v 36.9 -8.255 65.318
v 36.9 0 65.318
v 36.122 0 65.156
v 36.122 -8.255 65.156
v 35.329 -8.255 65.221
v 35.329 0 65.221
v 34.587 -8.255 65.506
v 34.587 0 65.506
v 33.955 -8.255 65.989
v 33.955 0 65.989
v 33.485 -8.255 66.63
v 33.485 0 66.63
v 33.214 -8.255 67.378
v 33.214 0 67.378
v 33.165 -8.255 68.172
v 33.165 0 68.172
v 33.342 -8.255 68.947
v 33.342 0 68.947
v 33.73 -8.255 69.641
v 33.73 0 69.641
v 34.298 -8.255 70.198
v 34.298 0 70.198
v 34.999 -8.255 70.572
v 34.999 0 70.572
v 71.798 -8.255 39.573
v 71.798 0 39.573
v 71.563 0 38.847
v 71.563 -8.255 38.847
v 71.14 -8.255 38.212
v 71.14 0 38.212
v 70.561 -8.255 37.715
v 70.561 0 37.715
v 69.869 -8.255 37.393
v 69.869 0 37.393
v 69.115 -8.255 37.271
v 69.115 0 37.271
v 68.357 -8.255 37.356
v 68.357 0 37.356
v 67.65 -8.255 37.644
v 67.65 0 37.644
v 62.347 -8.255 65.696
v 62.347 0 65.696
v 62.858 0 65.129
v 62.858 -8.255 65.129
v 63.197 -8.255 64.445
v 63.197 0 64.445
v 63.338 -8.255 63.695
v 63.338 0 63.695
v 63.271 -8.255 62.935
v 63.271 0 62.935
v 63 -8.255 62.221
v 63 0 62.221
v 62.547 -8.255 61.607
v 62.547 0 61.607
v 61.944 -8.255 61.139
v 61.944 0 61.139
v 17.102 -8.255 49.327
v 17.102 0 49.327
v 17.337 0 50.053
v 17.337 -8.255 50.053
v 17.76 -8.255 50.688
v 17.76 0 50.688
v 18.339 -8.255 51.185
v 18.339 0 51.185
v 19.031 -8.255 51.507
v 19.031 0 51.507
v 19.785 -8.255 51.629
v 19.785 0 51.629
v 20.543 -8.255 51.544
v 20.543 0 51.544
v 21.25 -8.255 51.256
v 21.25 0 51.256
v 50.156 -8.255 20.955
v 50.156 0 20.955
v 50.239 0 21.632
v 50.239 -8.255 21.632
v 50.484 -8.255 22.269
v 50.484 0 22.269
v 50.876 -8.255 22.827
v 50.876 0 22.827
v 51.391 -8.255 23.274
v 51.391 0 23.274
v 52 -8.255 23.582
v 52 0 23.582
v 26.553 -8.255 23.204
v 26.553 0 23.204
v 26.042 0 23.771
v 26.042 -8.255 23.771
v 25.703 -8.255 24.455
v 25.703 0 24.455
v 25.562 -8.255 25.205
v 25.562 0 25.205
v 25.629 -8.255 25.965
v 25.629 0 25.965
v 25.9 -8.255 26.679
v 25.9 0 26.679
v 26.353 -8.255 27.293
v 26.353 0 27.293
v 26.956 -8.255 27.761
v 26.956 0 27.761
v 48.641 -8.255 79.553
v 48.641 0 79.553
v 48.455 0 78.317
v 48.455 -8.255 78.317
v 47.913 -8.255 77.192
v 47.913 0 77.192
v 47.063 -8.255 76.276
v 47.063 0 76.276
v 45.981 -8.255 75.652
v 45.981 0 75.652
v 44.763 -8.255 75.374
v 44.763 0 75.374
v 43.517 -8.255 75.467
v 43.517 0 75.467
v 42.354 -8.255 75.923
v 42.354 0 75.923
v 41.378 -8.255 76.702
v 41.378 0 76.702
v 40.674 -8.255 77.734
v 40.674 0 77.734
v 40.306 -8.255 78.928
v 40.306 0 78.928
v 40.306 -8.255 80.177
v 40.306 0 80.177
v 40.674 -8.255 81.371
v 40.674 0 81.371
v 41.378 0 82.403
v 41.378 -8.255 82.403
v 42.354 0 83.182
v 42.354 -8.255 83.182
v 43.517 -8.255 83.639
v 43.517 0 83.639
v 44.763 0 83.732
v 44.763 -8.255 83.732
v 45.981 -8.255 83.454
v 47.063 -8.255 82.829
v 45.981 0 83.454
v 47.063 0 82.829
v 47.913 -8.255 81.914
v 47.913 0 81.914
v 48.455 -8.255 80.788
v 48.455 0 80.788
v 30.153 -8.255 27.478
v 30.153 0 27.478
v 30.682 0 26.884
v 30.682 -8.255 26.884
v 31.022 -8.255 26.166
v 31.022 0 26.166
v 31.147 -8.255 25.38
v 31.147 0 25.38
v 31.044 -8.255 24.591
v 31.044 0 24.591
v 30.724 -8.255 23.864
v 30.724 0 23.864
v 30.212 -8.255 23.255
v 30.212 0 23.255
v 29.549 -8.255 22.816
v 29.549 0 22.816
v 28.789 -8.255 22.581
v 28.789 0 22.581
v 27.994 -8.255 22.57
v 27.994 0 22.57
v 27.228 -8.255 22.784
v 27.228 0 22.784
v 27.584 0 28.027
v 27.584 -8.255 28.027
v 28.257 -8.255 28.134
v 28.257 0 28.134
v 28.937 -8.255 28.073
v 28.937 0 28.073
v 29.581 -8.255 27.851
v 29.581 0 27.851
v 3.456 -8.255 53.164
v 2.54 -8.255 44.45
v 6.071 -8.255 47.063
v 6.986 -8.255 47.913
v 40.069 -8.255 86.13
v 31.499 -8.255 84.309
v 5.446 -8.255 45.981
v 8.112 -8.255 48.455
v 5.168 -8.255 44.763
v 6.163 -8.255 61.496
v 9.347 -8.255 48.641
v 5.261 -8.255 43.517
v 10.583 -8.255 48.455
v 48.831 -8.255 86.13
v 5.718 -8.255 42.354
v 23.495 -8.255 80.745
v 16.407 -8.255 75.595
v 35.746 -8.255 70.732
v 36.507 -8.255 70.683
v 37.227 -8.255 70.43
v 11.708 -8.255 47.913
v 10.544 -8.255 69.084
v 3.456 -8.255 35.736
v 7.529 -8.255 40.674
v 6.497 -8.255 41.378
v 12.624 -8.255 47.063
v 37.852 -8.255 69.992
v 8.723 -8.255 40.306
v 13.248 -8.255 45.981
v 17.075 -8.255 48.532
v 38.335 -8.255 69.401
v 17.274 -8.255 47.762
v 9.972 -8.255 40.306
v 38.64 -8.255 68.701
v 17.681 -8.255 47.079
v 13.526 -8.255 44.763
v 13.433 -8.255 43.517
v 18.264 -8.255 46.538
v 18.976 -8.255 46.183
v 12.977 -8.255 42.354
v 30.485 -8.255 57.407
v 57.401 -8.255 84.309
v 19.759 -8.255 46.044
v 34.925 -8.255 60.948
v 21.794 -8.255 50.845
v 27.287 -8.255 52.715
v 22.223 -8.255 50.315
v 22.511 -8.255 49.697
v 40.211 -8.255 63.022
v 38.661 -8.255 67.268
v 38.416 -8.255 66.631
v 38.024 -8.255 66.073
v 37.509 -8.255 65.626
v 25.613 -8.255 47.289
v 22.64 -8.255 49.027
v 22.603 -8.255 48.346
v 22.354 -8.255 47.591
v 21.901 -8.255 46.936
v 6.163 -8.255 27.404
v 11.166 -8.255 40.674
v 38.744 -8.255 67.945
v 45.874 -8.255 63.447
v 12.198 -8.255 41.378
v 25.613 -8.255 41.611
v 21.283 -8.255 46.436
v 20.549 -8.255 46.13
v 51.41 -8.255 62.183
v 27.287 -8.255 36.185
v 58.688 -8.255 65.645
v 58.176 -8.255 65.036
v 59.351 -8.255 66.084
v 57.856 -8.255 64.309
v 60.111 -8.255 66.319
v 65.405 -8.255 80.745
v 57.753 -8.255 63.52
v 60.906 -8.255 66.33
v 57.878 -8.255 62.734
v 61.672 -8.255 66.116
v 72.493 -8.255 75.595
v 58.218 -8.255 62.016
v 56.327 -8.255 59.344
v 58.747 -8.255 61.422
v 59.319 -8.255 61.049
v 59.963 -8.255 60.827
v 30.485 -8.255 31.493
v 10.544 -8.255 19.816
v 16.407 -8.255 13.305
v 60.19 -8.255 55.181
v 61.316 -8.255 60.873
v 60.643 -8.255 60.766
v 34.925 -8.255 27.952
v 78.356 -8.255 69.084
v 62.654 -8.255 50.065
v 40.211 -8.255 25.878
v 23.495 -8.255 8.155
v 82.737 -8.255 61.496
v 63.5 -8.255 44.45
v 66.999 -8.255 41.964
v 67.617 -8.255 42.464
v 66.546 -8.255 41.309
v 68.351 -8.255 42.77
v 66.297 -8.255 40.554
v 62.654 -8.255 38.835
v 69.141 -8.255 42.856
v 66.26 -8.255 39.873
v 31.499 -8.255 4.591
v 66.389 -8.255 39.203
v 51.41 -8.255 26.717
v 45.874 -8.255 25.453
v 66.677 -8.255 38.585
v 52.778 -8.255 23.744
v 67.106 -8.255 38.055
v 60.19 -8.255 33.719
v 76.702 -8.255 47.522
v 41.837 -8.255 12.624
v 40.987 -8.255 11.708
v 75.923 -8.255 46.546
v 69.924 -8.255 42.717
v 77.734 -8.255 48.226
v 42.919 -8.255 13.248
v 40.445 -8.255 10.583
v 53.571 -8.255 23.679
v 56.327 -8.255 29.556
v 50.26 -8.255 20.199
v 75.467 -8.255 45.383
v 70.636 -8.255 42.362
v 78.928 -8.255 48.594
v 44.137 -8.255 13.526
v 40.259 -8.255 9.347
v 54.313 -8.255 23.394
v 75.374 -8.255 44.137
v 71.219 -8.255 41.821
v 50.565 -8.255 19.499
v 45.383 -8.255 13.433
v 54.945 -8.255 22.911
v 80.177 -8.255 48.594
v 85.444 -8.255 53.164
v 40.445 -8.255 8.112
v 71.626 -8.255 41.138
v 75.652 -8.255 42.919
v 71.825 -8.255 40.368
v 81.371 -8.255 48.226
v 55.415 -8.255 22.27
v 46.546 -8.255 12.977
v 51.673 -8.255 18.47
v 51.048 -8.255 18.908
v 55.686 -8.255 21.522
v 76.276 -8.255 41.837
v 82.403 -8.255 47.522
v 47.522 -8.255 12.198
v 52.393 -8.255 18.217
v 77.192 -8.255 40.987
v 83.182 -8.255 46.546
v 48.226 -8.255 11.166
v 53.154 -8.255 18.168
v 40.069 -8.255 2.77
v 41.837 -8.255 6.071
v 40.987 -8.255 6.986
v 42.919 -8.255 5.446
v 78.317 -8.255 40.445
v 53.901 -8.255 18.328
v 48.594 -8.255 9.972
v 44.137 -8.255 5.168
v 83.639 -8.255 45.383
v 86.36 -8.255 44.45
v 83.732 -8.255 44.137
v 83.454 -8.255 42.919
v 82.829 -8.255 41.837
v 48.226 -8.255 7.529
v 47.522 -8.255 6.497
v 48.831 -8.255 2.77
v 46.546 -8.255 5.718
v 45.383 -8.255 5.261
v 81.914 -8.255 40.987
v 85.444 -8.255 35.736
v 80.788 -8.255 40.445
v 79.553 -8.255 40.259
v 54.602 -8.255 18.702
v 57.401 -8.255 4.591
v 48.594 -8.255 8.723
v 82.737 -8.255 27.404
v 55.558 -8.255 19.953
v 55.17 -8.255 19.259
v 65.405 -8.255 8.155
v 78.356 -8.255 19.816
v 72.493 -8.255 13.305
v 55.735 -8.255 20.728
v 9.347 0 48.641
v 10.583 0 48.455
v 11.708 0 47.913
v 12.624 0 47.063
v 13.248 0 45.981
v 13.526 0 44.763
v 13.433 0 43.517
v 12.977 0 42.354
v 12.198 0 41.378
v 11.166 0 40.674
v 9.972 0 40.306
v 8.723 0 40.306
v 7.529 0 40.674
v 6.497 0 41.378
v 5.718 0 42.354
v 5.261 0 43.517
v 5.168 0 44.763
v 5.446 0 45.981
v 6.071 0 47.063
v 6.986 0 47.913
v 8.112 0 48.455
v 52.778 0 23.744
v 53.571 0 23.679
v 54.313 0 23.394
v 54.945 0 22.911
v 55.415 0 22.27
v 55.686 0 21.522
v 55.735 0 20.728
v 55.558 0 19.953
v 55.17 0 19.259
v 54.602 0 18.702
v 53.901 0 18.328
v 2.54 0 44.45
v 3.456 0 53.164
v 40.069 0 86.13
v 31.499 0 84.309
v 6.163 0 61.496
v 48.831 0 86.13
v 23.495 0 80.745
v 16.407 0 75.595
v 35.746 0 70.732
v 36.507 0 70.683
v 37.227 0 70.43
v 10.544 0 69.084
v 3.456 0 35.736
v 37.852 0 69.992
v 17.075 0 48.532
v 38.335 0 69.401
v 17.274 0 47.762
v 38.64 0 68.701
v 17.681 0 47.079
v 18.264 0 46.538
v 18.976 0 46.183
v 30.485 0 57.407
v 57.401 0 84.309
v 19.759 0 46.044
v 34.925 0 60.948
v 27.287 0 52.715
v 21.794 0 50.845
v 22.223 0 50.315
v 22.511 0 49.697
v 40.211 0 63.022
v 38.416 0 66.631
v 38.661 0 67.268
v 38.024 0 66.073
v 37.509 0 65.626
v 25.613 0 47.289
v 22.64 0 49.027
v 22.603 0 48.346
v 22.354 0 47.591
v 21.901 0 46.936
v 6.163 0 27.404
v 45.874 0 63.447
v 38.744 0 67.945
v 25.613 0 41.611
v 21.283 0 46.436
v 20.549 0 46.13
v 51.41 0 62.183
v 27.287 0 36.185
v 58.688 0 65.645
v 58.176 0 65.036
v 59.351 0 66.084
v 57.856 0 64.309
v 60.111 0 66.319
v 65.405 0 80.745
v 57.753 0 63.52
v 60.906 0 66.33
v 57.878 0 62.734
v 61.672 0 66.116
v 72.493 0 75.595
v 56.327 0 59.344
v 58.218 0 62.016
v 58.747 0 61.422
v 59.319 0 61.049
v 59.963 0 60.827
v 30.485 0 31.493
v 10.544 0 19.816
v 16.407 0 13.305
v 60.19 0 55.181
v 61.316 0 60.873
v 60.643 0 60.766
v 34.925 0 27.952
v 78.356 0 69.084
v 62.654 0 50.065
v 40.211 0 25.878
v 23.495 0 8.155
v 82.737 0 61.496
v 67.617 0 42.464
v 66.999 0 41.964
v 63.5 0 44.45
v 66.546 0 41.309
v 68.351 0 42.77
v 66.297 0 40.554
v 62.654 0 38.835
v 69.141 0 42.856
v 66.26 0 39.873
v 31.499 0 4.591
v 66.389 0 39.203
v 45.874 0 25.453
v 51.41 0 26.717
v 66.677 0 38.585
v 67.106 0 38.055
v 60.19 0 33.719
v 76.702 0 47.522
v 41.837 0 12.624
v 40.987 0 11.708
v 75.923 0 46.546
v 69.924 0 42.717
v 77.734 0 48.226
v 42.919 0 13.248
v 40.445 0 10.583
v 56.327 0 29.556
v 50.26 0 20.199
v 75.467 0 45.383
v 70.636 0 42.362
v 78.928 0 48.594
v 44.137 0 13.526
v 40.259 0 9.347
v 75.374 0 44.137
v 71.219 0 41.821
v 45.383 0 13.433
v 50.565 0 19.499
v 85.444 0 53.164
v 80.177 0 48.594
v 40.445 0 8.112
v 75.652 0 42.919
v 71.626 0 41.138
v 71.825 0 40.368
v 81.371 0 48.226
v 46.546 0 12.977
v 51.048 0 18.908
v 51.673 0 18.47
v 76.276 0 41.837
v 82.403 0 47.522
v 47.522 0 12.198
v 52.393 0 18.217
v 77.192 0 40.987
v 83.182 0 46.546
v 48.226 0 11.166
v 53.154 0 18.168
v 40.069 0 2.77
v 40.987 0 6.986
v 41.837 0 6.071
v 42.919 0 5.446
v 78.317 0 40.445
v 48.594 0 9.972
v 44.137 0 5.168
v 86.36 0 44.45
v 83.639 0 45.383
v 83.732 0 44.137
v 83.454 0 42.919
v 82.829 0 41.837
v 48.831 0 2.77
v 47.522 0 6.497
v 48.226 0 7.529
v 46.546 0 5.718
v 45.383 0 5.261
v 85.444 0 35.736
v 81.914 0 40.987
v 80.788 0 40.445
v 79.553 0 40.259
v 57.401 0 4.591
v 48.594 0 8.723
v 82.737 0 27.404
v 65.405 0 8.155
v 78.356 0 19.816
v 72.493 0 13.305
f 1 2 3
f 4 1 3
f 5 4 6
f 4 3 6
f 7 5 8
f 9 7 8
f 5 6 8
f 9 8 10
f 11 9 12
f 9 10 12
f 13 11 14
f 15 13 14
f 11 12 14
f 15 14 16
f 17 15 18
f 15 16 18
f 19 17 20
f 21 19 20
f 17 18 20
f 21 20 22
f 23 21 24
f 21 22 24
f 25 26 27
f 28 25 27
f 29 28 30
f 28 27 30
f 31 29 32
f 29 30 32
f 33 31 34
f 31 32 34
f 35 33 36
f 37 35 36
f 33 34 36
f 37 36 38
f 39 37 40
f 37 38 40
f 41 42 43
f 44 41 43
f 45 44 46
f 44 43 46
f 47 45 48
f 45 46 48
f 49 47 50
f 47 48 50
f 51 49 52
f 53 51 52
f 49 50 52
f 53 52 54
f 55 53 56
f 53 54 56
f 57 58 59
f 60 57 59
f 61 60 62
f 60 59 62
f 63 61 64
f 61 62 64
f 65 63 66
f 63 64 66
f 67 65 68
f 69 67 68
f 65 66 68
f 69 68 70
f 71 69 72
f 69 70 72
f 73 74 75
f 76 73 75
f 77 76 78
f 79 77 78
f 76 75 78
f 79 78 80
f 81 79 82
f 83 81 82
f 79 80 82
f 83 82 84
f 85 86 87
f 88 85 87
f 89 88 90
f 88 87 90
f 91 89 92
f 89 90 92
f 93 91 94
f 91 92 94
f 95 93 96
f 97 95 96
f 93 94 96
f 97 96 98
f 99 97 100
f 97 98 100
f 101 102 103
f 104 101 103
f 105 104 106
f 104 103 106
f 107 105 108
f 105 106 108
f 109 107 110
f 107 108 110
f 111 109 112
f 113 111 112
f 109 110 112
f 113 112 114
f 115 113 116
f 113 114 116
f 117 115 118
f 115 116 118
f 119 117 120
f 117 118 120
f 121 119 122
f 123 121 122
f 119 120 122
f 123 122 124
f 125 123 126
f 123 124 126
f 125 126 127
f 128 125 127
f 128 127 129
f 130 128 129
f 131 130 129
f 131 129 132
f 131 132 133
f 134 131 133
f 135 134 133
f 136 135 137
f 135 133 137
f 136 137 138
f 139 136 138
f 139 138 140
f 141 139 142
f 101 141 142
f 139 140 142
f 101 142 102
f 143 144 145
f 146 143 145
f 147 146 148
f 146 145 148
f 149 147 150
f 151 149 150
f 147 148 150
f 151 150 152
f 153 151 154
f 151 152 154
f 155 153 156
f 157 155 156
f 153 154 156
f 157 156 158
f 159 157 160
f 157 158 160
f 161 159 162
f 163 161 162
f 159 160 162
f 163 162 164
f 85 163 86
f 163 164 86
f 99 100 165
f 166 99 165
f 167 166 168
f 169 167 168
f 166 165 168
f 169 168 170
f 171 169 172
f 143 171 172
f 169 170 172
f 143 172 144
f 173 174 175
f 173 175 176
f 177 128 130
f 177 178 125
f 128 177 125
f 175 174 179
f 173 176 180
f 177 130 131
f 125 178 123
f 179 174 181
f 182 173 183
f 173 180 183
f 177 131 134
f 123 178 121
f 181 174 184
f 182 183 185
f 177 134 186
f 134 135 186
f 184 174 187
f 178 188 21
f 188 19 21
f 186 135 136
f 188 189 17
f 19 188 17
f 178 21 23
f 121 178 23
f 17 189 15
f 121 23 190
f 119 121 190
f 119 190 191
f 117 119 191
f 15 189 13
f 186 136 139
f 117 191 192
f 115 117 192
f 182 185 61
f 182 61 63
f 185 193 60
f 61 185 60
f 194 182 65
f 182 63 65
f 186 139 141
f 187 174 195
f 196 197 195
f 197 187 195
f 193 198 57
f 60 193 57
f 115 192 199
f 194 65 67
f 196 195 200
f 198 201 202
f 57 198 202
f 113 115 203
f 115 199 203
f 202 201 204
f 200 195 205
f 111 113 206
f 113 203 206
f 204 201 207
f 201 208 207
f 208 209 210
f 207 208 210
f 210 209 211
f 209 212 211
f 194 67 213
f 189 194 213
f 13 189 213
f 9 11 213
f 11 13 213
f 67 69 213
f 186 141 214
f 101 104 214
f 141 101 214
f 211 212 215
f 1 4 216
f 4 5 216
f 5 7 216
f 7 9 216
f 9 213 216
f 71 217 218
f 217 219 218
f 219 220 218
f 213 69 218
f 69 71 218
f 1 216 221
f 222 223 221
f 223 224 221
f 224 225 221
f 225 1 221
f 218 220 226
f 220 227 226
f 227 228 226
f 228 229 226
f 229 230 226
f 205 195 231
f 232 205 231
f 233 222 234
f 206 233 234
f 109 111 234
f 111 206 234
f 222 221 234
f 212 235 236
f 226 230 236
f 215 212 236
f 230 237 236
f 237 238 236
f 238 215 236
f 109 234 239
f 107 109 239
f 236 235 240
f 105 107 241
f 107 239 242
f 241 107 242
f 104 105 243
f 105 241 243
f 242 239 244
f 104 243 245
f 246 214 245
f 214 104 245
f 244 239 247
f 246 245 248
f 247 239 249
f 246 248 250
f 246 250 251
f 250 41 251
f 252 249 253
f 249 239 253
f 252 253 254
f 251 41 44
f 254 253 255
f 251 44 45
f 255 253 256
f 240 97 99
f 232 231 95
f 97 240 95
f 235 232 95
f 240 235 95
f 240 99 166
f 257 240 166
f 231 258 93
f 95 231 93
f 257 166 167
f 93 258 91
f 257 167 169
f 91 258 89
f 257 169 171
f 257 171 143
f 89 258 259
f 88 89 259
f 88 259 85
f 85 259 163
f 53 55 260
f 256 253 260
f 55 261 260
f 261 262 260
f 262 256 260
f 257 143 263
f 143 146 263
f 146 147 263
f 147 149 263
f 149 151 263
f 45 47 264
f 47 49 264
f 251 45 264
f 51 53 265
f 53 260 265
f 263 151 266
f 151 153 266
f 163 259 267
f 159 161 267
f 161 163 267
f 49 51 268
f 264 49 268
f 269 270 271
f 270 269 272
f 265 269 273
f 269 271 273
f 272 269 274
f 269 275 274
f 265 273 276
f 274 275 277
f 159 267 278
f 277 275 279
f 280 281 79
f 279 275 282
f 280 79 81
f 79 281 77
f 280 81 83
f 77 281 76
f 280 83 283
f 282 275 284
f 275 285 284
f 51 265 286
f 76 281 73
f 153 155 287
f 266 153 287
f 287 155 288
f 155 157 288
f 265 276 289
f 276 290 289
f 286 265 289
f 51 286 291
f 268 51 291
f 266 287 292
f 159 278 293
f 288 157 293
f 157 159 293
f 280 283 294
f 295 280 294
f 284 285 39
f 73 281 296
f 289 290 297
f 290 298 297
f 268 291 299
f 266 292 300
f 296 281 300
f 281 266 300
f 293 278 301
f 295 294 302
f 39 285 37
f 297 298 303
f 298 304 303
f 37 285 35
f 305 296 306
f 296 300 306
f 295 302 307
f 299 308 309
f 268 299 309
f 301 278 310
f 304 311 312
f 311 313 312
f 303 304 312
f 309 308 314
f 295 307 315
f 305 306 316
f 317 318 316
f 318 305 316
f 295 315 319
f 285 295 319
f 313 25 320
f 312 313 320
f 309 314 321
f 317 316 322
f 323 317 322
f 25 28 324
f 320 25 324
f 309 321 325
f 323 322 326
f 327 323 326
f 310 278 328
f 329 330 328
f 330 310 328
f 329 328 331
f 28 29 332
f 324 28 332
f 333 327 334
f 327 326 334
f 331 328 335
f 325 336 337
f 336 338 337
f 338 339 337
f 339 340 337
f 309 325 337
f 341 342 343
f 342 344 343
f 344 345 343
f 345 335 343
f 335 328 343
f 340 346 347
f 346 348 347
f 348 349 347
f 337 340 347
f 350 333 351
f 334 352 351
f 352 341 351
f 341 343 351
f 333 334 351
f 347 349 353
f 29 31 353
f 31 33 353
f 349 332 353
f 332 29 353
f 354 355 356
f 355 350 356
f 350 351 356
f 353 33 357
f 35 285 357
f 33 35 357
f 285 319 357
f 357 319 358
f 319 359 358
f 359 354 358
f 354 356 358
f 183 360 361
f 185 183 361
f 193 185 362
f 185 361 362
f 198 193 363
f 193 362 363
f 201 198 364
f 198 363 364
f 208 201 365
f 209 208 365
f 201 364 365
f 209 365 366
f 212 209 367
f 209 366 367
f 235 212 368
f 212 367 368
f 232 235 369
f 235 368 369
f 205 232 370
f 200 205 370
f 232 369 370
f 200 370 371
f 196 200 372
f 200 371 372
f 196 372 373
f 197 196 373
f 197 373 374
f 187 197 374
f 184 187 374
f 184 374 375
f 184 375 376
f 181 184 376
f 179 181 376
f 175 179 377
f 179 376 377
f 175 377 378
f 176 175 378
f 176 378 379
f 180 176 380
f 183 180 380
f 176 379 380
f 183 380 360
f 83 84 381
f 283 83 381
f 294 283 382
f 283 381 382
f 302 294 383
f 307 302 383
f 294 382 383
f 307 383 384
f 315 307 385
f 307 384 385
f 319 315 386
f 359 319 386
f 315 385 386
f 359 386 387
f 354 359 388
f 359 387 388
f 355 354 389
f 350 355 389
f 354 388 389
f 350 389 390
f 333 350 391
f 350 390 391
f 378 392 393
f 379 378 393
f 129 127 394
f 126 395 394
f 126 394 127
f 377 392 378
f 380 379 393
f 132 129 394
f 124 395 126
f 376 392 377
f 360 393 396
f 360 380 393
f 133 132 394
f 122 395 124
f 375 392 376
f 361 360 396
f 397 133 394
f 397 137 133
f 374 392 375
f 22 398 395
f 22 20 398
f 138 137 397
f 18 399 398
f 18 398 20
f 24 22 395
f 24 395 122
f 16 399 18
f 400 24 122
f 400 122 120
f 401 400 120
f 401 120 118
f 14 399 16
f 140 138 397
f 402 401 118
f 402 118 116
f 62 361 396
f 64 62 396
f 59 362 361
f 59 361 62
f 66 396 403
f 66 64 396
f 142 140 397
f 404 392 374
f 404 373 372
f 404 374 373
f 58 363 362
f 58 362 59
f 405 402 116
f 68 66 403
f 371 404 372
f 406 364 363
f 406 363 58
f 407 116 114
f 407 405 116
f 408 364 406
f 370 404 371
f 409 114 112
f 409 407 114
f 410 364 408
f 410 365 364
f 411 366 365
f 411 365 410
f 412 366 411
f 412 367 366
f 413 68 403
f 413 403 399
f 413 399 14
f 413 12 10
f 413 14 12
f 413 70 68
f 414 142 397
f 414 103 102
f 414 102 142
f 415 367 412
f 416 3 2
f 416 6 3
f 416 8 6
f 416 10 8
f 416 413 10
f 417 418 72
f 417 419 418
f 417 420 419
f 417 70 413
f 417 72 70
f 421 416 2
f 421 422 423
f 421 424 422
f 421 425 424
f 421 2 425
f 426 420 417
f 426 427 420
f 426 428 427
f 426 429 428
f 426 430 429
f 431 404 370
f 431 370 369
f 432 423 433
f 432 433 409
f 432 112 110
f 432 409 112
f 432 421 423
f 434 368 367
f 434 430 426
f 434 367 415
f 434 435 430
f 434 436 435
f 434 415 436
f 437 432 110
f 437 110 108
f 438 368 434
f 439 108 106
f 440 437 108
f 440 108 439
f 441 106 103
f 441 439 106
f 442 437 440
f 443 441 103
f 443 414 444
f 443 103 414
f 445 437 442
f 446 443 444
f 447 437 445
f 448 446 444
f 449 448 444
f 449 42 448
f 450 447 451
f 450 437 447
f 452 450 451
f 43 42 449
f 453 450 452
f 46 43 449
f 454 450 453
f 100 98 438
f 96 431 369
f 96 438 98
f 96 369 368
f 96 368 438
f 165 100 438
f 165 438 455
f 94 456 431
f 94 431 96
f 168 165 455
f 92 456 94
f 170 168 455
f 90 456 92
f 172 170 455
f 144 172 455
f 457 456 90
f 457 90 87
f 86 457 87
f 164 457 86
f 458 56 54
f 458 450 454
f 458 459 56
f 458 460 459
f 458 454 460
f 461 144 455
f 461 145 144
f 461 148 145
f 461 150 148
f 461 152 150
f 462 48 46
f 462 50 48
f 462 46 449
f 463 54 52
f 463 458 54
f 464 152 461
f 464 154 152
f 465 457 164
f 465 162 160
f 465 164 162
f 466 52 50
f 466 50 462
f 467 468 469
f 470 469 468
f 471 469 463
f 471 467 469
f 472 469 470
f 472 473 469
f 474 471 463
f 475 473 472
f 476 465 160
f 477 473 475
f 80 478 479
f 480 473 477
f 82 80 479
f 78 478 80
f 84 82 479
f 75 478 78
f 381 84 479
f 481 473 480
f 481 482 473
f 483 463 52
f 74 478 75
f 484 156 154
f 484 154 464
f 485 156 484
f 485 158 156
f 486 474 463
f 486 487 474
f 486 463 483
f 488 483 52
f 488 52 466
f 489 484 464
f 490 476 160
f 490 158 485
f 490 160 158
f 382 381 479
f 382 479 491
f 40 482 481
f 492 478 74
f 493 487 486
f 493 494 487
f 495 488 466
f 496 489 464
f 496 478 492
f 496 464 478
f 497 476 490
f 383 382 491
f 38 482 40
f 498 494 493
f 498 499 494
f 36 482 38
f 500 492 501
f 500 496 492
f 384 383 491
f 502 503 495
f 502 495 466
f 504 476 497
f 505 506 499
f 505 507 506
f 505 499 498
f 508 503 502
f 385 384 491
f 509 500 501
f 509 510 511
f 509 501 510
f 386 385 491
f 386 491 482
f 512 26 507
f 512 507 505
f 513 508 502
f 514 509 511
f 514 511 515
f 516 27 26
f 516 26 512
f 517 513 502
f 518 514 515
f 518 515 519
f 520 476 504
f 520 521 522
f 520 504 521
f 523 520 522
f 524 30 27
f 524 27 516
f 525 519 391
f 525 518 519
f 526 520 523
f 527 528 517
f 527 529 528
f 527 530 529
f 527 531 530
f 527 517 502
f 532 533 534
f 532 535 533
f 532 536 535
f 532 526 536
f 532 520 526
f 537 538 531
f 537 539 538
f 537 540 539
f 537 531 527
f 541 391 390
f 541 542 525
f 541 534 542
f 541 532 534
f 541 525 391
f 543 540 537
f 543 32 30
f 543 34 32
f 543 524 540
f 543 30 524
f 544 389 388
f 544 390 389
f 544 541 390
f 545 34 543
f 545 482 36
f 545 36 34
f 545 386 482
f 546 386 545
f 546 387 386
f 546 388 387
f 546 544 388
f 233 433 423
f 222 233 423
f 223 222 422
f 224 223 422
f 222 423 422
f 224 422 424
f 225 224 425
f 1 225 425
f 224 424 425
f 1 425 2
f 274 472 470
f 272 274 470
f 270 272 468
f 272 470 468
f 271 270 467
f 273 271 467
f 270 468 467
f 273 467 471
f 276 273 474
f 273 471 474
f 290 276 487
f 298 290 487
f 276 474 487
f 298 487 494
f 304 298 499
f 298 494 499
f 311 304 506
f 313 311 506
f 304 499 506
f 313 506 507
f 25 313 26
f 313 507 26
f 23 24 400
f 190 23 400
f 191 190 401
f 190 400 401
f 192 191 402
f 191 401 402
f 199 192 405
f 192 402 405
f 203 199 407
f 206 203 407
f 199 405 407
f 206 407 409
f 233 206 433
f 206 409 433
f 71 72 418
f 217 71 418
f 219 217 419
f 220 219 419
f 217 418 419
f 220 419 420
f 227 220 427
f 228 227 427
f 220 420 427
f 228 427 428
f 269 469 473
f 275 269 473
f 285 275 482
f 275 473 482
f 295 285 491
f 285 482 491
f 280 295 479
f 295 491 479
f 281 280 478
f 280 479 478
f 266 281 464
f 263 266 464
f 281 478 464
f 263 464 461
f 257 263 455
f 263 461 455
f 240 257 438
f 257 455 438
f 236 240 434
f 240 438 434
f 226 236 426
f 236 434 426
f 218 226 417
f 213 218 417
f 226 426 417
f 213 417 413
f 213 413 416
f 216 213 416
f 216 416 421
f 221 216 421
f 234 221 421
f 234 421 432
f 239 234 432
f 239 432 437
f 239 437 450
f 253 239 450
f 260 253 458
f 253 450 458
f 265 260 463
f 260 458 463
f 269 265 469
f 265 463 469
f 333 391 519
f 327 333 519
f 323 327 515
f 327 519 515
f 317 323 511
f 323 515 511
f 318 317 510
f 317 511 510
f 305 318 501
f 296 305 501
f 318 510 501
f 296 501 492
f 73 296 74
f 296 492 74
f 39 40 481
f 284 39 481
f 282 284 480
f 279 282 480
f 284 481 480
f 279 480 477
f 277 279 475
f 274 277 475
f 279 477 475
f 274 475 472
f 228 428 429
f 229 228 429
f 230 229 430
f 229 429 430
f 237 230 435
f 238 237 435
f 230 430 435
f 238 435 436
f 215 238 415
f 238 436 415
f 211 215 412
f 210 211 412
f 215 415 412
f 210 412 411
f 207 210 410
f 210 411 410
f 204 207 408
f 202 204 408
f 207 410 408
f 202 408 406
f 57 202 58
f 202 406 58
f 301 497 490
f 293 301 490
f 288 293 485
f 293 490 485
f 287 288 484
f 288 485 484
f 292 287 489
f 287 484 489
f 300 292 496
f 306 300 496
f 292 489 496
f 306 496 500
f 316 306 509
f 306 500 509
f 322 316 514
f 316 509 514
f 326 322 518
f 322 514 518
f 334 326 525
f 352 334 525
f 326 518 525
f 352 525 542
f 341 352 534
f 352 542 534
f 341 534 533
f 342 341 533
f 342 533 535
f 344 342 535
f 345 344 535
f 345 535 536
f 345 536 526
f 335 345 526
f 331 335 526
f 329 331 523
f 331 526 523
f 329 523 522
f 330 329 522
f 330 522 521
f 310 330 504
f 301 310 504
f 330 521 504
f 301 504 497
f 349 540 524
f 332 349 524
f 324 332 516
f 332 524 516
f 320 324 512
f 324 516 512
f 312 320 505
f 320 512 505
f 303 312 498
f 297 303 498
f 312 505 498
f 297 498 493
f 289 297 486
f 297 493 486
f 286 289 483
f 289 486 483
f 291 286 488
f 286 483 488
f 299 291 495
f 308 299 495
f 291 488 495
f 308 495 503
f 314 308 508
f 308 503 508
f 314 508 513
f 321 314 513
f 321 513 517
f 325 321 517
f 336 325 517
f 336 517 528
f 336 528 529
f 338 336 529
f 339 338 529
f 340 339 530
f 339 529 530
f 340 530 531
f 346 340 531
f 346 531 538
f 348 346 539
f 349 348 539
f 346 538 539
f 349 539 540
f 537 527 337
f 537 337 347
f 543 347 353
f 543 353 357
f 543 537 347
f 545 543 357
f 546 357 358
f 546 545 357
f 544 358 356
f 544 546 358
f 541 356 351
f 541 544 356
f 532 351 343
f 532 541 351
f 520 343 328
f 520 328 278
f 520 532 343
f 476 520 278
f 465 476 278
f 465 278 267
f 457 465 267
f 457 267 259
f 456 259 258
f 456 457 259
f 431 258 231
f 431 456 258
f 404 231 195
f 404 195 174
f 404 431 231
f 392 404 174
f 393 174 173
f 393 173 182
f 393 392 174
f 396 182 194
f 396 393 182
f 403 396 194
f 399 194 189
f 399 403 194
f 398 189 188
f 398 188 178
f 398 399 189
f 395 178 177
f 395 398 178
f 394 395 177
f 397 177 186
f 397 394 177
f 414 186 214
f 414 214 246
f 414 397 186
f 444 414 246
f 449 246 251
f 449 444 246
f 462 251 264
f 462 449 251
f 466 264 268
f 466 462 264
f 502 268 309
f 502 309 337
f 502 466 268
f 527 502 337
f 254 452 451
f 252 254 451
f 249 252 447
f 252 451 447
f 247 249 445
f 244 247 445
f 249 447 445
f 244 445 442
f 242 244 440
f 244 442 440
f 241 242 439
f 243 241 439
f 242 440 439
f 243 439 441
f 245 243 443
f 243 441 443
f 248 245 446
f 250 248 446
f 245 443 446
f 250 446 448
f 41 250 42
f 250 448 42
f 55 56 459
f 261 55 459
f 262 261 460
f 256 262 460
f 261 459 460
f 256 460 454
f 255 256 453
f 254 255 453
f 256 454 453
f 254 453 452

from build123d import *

# Parameters (mm, degrees)
SKETCH1_W           = 88.9
SKETCH1_H           = 88.9
BOSS_EXTRUDE1_DEPTH = 8.255
SKETCH5_W           = 88.9
SKETCH5_H           = 88.9
SKETCH5_R           = 41.91
CUT_EXTRUDE5_DEPTH  = 8.255
SKETCH9_R           = 4.191
CUT_EXTRUDE7_DEPTH  = 8.255
CIRPATTERN1_COUNT   = 4
CUT_EXTRUDE9_DEPTH  = 8.255
CIRPATTERN3_COUNT   = 6
SKETCH8_R           = 19.05
CUT_EXTRUDE10_DEPTH = 8.255


with BuildPart() as part:
    # Sketch1 → Boss-Extrude1 (new body)
    with BuildSketch(Plane(origin=(0, 0, 0), x_dir=(1, 0, 0), z_dir=(0, 1, 0))):
        with Locations((44.45, -44.45)):
            Rectangle(SKETCH1_W, SKETCH1_H)
    extrude(amount=-BOSS_EXTRUDE1_DEPTH)

    # Sketch5 → Cut-Extrude5 (cut)
    with BuildSketch(Plane(origin=(0, 0, 0), x_dir=(1, 0, 0), z_dir=(0, 1, 0))):
        with Locations((44.45, -44.45)):
            Rectangle(SKETCH5_W, SKETCH5_H)
        with Locations((44.45, -44.45)):
            Circle(SKETCH5_R, mode=Mode.SUBTRACT)
    extrude(amount=-CUT_EXTRUDE5_DEPTH, mode=Mode.SUBTRACT)

    # Sketch9 → Cut-Extrude7 (cut)
    with BuildSketch(Plane(origin=(0, 0, 0), x_dir=(1, 0, 0), z_dir=(0, 1, 0))):
        with Locations((44.45, -79.5528)):
            Circle(SKETCH9_R)
    cut_extrude7 = extrude(amount=-CUT_EXTRUDE7_DEPTH, mode=Mode.SUBTRACT)

    # CirPattern1: Cut-Extrude7 ×4 about axis
    cirpattern1_axis = Axis((44.45, 0, 44.45), (0, 1, 0))
    for i in range(1, CIRPATTERN1_COUNT):
        add(cut_extrude7.rotate(cirpattern1_axis, i * 360 / CIRPATTERN1_COUNT), mode=Mode.SUBTRACT)

    # Sketch11 → Cut-Extrude9 (cut)
    with BuildSketch(Plane(origin=(0, 0, 0), x_dir=(1, 0, 0), z_dir=(0, 1, 0))):
        with BuildLine():
            ThreePointArc((38.743889634, -67.945), (38.237051273, -66.340217261), (36.900419598, -65.317657467))
            Line((36.900419598, -65.317657467), (34.99935967, -70.572342533))
            ThreePointArc((34.99935967, -70.572342533), (37.554672374, -70.232161638), (38.743889634, -67.945))
        make_face()
        with BuildLine():
            Line((34.99935967, -70.572342533), (36.900419598, -65.317657467))
            ThreePointArc((36.900419598, -65.317657467), (33.322547101, -66.994470036), (34.99935967, -70.572342533))
        make_face()
    cut_extrude9 = extrude(amount=-CUT_EXTRUDE9_DEPTH, mode=Mode.SUBTRACT)

    # CirPattern3: Cut-Extrude9 ×6 about axis
    cirpattern3_axis = Axis((44.45, 0, 44.45), (0, 1, 0))
    for i in range(1, CIRPATTERN3_COUNT):
        add(cut_extrude9.rotate(cirpattern3_axis, i * 360 / CIRPATTERN3_COUNT), mode=Mode.SUBTRACT)

    # Sketch8 → Cut-Extrude10 (cut)
    with BuildSketch(Plane(origin=(0, 0, 0), x_dir=(1, 0, 0), z_dir=(0, 1, 0))):
        with Locations((44.45, -44.45)):
            Circle(SKETCH8_R)
    extrude(amount=-CUT_EXTRUDE10_DEPTH, mode=Mode.SUBTRACT)


solid = part.part
